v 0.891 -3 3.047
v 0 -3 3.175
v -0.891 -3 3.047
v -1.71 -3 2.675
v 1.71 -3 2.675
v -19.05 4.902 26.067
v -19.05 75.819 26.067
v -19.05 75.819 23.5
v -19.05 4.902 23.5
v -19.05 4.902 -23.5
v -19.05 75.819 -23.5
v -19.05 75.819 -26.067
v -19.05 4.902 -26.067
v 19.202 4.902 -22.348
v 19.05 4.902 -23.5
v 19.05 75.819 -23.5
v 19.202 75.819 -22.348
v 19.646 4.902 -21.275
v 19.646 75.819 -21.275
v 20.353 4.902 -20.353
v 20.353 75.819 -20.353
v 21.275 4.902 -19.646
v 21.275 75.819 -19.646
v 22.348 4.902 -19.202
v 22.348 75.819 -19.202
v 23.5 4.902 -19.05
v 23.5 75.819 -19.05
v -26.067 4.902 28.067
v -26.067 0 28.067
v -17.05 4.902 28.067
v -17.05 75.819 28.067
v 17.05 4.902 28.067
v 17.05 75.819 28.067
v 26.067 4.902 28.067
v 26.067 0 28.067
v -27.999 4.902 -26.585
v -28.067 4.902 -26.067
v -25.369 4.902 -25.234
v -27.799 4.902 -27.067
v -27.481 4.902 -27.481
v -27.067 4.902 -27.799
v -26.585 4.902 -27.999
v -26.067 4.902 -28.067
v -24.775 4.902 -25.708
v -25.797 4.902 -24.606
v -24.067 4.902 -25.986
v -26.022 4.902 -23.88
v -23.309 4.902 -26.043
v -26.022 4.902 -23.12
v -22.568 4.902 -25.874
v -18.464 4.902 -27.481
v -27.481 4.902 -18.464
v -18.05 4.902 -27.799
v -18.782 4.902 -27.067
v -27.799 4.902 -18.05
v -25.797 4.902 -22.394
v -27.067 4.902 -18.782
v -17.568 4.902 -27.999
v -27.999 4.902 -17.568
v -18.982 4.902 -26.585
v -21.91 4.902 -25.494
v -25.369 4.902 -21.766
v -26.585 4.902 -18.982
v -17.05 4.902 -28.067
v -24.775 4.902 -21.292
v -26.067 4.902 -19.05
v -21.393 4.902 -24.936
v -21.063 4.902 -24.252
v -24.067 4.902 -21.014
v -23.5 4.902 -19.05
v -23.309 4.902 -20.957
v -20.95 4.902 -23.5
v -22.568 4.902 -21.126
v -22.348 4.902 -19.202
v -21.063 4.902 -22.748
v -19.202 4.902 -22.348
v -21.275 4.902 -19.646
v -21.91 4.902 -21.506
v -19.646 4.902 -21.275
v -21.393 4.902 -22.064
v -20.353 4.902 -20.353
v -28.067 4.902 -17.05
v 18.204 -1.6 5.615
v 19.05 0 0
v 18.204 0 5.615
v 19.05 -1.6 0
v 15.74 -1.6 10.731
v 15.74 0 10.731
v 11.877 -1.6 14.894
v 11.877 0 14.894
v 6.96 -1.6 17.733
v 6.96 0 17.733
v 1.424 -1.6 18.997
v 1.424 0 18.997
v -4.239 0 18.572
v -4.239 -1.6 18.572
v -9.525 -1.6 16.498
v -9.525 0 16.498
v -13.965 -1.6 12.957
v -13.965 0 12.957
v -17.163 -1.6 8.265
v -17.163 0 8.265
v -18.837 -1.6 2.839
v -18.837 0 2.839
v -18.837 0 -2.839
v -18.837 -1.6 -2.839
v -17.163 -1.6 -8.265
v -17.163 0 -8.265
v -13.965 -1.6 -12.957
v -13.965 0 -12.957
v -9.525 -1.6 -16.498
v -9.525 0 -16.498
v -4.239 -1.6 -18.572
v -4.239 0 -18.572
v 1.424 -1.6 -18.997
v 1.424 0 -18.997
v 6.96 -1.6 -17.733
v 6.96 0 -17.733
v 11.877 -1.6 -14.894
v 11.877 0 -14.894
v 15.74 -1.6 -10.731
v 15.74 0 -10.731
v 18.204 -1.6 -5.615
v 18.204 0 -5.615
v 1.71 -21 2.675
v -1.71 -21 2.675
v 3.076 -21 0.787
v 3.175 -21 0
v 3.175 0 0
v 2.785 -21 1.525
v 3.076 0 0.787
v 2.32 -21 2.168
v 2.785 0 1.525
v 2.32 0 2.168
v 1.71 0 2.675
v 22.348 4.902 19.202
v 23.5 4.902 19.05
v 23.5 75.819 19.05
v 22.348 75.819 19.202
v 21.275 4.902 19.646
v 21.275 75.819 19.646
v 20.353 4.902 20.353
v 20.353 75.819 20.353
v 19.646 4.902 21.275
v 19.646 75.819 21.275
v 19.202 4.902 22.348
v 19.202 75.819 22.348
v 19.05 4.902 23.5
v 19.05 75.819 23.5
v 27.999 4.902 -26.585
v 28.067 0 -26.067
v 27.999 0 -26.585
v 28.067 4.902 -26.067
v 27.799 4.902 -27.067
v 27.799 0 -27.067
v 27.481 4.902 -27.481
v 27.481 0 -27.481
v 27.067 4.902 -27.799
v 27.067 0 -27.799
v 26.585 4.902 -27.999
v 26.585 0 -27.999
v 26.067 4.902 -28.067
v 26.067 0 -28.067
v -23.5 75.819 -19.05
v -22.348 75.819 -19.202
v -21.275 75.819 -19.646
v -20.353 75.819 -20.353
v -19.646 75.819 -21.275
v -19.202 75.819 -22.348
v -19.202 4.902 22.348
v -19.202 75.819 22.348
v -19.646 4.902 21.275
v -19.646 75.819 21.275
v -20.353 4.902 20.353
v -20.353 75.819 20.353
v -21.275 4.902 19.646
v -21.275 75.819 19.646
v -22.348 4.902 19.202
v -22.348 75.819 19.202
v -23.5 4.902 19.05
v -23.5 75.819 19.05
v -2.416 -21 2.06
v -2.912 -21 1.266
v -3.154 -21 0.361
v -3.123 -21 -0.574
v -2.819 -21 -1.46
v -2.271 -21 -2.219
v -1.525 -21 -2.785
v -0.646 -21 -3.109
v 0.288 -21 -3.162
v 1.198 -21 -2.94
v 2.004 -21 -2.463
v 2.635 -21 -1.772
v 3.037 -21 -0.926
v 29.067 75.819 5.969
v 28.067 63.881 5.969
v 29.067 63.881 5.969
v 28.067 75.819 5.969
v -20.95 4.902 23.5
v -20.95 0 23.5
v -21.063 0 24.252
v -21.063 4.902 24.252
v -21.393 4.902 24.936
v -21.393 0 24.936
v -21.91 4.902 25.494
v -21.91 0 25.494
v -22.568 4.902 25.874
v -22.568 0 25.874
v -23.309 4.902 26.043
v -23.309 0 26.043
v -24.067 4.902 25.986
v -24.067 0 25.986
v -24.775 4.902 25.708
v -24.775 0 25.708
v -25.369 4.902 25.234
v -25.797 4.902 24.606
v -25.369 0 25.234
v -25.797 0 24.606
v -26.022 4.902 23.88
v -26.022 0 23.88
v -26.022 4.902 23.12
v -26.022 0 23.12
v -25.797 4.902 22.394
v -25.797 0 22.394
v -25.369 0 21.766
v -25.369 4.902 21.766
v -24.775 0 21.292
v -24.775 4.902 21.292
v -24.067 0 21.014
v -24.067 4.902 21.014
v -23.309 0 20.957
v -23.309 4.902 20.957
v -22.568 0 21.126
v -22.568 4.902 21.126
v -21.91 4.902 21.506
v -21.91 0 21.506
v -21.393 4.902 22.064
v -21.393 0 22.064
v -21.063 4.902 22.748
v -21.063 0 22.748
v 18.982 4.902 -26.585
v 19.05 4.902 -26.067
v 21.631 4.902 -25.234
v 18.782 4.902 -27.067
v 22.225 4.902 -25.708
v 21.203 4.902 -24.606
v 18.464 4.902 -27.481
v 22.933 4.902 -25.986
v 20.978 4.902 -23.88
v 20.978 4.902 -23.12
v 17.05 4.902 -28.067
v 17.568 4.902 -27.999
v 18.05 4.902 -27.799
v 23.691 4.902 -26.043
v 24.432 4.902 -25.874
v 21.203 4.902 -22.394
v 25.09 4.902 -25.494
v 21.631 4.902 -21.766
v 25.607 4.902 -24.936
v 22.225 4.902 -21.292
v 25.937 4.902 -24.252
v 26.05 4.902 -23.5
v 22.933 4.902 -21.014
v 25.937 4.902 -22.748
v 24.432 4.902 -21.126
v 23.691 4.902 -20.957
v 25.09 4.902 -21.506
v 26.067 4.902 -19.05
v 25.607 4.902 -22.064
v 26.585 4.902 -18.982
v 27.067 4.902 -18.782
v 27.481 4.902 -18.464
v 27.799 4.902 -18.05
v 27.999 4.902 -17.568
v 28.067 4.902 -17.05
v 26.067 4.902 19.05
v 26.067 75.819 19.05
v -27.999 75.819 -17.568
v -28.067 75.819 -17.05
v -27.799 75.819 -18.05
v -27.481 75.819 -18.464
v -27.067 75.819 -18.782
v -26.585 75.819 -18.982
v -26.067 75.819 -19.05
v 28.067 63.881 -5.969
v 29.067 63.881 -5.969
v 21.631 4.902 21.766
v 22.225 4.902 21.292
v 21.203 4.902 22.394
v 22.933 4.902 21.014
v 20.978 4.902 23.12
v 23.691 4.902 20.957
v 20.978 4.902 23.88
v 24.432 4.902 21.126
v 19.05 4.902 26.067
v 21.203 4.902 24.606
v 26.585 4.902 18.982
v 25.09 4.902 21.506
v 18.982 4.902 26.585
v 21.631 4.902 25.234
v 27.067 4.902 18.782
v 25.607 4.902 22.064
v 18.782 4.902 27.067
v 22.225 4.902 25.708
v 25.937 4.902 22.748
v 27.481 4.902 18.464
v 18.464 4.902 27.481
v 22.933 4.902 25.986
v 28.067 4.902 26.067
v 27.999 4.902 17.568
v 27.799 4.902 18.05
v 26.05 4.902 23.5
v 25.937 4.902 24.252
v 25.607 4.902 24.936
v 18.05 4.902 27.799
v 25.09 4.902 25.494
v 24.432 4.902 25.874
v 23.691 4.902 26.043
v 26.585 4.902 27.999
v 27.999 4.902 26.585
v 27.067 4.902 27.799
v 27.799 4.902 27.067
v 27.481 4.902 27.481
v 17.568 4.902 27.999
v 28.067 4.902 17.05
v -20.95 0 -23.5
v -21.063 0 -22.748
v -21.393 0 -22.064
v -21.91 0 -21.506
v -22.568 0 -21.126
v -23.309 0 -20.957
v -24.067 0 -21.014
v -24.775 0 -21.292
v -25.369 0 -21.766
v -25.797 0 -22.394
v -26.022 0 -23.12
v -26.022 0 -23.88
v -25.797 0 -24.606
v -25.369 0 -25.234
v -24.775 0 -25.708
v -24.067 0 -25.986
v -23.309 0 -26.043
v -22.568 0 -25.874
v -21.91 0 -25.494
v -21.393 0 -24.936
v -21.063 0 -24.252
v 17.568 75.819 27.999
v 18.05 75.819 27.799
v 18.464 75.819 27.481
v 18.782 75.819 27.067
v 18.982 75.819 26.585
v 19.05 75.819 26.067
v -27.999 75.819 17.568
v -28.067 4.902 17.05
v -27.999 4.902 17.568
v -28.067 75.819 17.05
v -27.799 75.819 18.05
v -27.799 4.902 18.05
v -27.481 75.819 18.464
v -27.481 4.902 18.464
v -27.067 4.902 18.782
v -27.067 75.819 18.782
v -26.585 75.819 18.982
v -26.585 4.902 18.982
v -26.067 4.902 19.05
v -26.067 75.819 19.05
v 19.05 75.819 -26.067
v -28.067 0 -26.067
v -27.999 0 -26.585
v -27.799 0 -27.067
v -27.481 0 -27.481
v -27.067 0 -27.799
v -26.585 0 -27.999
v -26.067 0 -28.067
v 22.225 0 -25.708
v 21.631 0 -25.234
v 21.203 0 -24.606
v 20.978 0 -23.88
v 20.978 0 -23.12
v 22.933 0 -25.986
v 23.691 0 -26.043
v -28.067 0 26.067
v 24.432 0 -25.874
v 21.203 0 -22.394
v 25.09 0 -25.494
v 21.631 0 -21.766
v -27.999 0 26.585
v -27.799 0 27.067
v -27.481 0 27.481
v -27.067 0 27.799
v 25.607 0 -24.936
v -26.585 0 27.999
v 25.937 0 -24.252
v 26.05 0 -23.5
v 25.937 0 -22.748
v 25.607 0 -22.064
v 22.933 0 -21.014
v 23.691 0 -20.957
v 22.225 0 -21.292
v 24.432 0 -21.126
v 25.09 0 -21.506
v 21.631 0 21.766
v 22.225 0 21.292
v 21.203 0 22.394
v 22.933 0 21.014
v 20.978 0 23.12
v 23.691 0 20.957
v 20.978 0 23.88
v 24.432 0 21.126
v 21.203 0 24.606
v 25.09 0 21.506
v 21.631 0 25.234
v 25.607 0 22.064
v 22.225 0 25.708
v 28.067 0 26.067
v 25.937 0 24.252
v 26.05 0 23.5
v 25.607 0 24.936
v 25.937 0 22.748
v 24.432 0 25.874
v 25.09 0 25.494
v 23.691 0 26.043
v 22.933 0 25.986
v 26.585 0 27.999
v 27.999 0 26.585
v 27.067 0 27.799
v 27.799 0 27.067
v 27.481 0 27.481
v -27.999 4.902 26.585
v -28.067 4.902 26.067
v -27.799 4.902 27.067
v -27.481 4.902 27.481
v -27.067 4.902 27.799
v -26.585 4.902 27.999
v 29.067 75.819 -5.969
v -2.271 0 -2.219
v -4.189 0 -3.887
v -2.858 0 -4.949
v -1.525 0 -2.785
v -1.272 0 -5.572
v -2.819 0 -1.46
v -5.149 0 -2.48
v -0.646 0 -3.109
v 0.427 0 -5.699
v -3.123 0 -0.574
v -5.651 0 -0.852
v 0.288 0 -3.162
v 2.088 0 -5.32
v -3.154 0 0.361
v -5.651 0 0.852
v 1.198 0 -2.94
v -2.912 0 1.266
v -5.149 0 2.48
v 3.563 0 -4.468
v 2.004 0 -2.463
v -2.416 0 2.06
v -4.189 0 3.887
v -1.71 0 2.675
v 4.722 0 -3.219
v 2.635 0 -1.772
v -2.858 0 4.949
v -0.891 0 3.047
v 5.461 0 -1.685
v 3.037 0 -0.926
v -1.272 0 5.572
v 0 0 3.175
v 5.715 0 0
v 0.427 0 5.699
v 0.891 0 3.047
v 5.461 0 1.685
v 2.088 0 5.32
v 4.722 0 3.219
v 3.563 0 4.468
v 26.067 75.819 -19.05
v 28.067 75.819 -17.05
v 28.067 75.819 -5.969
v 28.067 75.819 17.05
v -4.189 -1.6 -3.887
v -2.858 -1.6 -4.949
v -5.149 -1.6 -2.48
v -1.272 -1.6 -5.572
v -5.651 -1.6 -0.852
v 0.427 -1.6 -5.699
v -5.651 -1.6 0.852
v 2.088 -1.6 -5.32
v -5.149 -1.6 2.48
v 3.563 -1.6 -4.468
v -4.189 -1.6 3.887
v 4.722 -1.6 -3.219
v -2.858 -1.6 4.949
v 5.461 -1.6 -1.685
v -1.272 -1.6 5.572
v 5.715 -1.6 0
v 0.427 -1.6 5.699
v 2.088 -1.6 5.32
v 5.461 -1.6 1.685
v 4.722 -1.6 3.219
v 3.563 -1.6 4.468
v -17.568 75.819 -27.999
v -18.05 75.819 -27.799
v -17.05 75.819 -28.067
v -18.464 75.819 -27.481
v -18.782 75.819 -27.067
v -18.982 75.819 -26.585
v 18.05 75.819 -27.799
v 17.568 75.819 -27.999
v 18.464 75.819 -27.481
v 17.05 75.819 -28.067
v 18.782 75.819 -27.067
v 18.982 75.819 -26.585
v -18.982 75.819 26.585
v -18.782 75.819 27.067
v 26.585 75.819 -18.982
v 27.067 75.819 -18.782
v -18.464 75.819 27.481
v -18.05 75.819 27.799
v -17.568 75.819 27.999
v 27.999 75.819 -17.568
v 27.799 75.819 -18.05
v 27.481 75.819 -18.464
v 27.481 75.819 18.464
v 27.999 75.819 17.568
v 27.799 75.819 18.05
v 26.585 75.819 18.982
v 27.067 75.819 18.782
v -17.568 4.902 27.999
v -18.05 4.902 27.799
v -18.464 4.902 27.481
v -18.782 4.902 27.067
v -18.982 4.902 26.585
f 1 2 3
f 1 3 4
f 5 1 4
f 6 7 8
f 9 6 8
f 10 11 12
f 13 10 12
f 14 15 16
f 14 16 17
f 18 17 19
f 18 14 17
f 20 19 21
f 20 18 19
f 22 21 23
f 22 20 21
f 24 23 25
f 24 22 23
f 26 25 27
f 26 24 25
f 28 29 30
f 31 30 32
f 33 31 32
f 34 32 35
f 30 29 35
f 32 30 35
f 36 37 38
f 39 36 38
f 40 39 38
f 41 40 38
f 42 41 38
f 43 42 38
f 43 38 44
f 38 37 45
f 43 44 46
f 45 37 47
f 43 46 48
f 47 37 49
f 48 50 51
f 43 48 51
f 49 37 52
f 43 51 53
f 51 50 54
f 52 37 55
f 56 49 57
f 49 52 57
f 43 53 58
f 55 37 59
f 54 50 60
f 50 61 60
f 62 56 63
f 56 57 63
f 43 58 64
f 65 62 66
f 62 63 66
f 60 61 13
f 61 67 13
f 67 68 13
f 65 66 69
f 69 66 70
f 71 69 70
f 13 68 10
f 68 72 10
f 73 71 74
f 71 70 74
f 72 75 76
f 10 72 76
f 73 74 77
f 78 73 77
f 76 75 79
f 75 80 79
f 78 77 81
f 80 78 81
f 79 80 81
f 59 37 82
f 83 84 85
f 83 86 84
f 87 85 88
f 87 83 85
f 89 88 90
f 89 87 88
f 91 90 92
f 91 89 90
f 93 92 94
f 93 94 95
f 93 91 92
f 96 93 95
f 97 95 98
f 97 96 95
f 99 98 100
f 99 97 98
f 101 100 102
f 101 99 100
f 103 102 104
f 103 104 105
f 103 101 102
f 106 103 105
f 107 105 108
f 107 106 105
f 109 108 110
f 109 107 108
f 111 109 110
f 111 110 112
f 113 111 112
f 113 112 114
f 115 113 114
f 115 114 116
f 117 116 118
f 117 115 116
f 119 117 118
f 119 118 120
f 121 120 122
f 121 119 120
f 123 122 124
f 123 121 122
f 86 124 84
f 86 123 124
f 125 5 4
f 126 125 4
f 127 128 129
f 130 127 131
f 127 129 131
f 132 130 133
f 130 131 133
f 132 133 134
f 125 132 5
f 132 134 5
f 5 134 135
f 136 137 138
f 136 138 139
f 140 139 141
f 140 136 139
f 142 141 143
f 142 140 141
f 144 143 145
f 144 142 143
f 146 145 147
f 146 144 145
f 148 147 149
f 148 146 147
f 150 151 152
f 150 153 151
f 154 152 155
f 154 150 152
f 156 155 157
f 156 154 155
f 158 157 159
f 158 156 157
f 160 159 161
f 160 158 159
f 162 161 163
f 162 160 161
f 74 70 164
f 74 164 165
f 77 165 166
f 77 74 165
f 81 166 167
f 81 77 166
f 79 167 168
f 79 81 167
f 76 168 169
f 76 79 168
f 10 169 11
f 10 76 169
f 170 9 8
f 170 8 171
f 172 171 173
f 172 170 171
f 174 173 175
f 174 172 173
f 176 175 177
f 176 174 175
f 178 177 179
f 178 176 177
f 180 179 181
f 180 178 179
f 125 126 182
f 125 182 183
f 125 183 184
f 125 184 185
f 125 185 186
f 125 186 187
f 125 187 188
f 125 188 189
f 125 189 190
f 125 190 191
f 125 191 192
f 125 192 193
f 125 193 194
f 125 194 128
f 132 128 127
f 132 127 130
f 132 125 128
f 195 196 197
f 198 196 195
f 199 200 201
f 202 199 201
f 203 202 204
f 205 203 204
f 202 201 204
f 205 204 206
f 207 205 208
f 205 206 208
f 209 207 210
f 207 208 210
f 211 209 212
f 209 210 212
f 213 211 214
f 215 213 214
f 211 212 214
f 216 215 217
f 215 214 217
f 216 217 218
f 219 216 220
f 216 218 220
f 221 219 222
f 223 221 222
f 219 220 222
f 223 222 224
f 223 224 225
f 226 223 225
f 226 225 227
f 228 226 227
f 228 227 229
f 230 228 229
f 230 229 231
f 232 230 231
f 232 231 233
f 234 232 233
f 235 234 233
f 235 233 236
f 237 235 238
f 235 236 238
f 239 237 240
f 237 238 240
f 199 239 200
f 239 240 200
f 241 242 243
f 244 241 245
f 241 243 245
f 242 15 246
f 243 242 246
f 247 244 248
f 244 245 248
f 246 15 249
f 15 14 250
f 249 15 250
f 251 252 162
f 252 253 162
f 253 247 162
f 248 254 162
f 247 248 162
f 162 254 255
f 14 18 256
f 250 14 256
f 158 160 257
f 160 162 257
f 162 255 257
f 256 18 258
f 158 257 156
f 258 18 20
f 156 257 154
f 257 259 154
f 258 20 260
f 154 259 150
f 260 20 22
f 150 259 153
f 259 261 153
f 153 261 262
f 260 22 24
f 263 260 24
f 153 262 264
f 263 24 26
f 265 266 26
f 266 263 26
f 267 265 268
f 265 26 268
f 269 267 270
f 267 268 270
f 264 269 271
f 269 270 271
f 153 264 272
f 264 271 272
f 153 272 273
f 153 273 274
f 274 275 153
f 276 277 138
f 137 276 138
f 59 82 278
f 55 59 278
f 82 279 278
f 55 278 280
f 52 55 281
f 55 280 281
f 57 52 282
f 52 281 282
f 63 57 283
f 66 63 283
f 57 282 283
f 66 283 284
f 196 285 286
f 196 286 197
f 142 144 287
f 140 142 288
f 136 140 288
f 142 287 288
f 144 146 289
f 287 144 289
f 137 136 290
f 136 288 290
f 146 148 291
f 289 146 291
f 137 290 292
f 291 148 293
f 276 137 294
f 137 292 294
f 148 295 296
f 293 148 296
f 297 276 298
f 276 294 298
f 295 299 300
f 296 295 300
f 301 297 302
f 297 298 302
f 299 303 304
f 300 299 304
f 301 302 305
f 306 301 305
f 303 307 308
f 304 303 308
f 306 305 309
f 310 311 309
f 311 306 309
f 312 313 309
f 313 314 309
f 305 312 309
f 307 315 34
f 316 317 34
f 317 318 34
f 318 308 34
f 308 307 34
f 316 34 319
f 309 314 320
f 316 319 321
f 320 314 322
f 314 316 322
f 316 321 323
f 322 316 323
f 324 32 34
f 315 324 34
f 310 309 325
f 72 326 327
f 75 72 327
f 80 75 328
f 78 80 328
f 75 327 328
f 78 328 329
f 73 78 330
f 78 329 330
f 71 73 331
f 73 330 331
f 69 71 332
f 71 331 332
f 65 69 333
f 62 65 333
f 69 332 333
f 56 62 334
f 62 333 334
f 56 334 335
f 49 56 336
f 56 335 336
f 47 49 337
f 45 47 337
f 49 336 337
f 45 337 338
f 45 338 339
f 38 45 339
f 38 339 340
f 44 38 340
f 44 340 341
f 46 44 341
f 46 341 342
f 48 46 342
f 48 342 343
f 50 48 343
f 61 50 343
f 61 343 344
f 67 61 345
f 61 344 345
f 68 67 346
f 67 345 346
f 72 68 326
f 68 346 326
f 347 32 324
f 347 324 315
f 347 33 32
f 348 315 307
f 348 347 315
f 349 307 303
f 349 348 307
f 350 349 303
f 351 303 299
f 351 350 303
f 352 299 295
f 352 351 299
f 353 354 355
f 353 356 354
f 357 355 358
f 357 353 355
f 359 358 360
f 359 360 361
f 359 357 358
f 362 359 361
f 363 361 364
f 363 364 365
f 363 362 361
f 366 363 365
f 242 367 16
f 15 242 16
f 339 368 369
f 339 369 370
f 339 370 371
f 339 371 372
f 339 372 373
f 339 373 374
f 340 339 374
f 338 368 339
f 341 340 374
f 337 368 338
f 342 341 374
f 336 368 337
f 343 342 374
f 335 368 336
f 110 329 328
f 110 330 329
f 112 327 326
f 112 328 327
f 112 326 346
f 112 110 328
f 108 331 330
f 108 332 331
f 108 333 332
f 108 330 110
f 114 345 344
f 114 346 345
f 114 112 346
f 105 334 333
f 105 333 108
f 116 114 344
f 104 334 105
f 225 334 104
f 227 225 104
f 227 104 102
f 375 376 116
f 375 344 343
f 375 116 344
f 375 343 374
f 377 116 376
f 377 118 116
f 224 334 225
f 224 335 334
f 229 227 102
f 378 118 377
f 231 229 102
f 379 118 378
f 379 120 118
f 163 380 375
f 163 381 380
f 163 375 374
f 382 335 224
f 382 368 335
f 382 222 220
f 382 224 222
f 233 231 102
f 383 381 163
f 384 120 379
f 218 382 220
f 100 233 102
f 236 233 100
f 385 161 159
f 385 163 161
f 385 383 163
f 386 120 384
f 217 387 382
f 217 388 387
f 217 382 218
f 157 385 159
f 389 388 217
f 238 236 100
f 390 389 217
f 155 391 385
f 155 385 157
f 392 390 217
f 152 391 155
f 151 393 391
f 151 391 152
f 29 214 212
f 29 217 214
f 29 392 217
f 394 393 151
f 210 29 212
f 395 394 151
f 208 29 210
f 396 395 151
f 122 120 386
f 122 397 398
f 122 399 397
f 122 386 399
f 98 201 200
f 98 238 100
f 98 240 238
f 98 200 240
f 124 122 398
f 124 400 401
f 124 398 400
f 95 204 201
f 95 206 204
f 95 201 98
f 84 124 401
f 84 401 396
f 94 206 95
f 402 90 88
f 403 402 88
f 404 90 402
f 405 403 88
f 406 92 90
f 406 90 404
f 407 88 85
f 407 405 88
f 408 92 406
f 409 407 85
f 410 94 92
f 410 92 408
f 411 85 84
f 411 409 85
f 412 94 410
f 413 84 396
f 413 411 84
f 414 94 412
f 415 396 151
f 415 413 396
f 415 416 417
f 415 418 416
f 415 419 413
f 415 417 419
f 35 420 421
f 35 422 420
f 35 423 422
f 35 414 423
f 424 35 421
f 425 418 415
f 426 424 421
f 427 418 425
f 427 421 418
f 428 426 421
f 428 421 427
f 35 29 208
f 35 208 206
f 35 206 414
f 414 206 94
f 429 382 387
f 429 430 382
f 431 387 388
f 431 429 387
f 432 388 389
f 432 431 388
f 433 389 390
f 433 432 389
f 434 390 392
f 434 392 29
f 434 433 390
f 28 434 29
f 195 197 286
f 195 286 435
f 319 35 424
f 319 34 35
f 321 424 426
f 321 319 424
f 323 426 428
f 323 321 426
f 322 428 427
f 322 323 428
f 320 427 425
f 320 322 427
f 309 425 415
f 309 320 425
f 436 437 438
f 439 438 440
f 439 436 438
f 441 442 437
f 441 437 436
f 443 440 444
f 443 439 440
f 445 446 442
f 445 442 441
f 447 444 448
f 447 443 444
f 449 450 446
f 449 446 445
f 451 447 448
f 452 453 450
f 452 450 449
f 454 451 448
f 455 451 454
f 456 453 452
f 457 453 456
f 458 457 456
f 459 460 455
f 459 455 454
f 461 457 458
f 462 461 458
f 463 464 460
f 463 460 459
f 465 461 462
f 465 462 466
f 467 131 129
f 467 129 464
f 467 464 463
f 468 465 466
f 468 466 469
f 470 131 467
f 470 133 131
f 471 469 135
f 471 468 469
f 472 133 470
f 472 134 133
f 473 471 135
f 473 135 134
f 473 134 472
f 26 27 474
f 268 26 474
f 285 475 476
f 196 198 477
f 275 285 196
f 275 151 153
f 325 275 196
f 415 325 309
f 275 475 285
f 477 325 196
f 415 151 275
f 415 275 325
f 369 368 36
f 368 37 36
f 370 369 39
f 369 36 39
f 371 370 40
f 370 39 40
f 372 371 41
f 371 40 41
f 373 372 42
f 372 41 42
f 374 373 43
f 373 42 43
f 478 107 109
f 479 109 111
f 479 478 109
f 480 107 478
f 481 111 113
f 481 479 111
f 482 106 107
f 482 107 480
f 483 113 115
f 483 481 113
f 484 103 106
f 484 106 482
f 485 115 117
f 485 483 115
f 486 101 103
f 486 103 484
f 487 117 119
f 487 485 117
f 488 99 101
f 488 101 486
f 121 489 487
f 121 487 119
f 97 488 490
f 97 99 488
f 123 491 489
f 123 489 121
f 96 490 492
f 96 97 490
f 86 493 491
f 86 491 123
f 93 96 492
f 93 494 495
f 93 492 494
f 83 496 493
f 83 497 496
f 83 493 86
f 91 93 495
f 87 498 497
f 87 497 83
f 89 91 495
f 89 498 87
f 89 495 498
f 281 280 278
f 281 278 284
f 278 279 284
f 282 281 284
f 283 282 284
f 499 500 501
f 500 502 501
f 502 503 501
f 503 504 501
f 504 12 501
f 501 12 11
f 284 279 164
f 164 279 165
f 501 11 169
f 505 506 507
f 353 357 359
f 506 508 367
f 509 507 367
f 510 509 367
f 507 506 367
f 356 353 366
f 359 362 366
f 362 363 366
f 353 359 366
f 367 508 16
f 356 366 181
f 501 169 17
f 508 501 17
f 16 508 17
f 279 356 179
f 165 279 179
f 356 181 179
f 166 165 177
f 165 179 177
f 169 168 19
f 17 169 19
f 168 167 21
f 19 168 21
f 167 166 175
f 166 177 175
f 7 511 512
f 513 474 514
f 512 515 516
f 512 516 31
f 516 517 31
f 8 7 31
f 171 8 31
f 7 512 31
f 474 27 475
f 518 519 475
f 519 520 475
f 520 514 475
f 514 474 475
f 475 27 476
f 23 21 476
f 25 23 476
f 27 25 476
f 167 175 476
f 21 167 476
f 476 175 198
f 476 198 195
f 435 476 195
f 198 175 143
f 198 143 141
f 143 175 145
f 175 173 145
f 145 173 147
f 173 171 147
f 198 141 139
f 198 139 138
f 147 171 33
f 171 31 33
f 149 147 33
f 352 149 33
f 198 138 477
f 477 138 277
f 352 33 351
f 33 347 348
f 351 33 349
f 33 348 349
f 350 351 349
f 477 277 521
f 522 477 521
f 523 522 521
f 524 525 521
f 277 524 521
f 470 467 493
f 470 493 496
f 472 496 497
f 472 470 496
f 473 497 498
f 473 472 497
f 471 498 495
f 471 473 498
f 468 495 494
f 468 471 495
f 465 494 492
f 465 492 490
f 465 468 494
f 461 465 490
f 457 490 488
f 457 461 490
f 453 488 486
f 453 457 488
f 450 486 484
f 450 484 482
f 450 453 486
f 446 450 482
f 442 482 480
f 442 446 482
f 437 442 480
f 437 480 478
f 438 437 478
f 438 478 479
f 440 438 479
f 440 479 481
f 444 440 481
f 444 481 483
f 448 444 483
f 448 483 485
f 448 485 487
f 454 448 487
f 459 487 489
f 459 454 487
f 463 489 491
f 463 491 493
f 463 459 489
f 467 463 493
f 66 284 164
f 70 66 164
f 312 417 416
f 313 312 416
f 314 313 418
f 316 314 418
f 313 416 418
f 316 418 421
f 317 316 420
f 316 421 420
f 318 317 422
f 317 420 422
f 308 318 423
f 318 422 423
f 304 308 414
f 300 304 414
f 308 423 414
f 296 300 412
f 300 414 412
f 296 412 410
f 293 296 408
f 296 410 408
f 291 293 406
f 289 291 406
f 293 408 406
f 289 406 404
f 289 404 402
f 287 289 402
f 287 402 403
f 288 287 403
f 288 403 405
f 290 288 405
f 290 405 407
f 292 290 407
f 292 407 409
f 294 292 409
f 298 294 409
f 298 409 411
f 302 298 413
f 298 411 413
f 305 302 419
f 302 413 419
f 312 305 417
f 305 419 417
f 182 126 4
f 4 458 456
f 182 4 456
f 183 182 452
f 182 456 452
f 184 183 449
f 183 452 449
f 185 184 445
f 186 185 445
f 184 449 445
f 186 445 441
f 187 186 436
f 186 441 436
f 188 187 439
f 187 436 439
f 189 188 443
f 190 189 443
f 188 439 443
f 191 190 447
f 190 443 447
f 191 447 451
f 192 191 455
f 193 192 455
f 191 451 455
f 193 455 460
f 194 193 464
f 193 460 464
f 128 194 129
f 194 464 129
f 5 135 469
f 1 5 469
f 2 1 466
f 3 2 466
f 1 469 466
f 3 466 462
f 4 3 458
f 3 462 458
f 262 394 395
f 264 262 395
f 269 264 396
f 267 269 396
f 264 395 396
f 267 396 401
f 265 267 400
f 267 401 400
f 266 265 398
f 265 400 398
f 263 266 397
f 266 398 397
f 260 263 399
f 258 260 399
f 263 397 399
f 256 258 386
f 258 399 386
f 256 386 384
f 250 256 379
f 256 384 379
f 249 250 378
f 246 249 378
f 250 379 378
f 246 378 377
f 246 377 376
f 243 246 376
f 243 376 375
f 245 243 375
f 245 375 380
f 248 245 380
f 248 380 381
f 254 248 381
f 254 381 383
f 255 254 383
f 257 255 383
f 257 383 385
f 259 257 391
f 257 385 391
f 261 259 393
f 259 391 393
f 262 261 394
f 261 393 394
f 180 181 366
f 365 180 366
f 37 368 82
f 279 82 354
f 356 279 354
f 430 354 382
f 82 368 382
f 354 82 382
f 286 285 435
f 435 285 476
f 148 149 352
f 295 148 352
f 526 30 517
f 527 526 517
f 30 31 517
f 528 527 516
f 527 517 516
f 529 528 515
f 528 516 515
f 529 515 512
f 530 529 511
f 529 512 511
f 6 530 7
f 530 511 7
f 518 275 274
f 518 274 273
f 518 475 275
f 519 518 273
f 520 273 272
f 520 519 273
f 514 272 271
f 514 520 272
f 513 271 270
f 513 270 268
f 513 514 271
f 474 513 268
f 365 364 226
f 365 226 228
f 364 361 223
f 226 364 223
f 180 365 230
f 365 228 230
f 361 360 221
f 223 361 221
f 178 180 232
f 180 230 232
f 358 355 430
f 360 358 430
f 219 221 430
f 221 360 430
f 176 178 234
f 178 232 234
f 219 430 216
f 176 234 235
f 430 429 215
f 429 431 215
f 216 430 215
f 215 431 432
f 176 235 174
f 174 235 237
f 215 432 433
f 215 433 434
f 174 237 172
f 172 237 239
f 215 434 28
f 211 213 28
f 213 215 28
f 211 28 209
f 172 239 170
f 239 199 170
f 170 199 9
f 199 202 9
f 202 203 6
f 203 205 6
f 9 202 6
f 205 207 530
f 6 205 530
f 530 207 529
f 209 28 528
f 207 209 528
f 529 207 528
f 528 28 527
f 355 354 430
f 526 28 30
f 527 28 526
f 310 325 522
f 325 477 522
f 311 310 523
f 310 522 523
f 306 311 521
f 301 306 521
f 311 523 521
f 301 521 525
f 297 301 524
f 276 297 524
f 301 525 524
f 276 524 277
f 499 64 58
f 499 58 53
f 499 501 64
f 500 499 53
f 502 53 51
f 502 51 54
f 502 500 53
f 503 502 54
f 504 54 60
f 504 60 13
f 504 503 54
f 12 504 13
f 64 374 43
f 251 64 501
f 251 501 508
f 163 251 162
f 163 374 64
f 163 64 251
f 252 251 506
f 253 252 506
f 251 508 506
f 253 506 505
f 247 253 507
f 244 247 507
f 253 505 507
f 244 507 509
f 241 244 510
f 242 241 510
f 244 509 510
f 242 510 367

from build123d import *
from build123d import SkipClean  # not in build123d's __all__

# Parameters (mm, degrees)
F1_DEPTH      = 21
F2_DEPTH      = 3
F0_R          = 19.05
F0_R_2        = 5.715
F3_DEPTH      = 1.6
F3_DEPTH_BACK = 10
F0_W          = 56.134
F0_H          = 56.134
F0_R_3        = 2.55
F4_DEPTH      = 4.9022
F6_DEPTH      = 75.819
F7_R          = 2
F8_W          = 11.938
F8_H          = 11.938
F9_DEPTH      = 1


with BuildPart() as f1:
    # F0 (on Front) → F1 (new body)
    with BuildSketch(Plane.XZ):
        with BuildLine():
            ThreePointArc((-1.7102631376, 2.675), (-1.5248835264, -2.7848438432), (3.175, 0))
            ThreePointArc((3.175, 0), (2.7848438432, 1.5248835264), (1.7102631376, 2.675))
            Line((1.7102631376, 2.675), (-1.7102631376, 2.675))
        make_face()
    extrude(amount=F1_DEPTH)

    # F0 (on Front) → F2 (join, symmetric)
    with BuildSketch(Plane.XZ):
        with BuildLine():
            Line((-1.7102631376, 2.675), (1.7102631376, 2.675))
            ThreePointArc((1.7102631376, 2.675), (0, 3.175), (-1.7102631376, 2.675))
        make_face()
        with BuildLine():
            ThreePointArc((-1.7102631376, 2.675), (-1.5248835264, -2.7848438432), (3.175, 0))
            ThreePointArc((3.175, 0), (2.7848438432, 1.5248835264), (1.7102631376, 2.675))
            Line((1.7102631376, 2.675), (-1.7102631376, 2.675))
        make_face()
    with SkipClean():  # cleaning this boolean's faces spoils the solid; the shape is the same uncleaned
        extrude(amount=F2_DEPTH, both=True)



with BuildPart() as f3:
    # F0 (on Front) → F3 (new body, two sides)
    with BuildSketch(Plane.XZ) as f3_sk:
        Circle(F0_R)
        Circle(F0_R_2, mode=Mode.SUBTRACT)
    extrude(amount=F3_DEPTH)
    extrude(f3_sk.sketch, amount=-F3_DEPTH_BACK)

    # F0 (on Front) → F4 (join)
    with BuildSketch(Plane.XZ):
        Rectangle(F0_W, F0_H)
        with Locations((-23.5, -23.5)):
            Circle(F0_R_3, mode=Mode.SUBTRACT)
        with Locations((23.5, -23.5)):
            Circle(F0_R_3, mode=Mode.SUBTRACT)
        with Locations((-23.5, 23.5)):
            Circle(F0_R_3, mode=Mode.SUBTRACT)
        Circle(F0_R, mode=Mode.SUBTRACT)
        with Locations((23.5, 23.5)):
            Circle(F0_R_3, mode=Mode.SUBTRACT)
    extrude(amount=-F4_DEPTH)


with BuildPart() as f1_1:
    add(f1.part, clean=False)

    with SkipClean():  # cleaning this boolean's faces spoils the solid; the shape is the same uncleaned
        add(f3.part)  # F6 merges F3
    # F5 (on Front) → F6 (join)
    with BuildSketch(Plane.XZ):
        with BuildLine():
            ThreePointArc((-19.05, 23.5), (-20.3533748237, 20.3533748237), (-23.5, 19.05))
            Line((-23.5, 19.05), (-28.067, 19.05))
            Line((-28.067, 19.05), (-28.067, -19.05))
            Line((-28.067, -19.05), (-23.5, -19.05))
            ThreePointArc((-23.5, -19.05), (-20.3533748237, -20.3533748237), (-19.05, -23.5))
            Line((-19.05, -23.5), (-19.05, -28.067))
            Line((-19.05, -28.067), (19.05, -28.067))
            Line((19.05, -28.067), (19.05, -23.5))
            ThreePointArc((19.05, -23.5), (20.3533748237, -20.3533748237), (23.5, -19.05))
            Line((23.5, -19.05), (28.067, -19.05))
            Line((28.067, -19.05), (28.067, 19.05))
            Line((28.067, 19.05), (23.5, 19.05))
            ThreePointArc((23.5, 19.05), (20.3533748237, 20.3533748237), (19.05, 23.5))
            Line((19.05, 23.5), (19.05, 28.067))
            Line((19.05, 28.067), (-19.05, 28.067))
            Line((-19.05, 28.067), (-19.05, 23.5))
        make_face()
    with SkipClean():  # cleaning this boolean's faces spoils the solid; the shape is the same uncleaned
        extrude(amount=-F6_DEPTH)

    # F7
    f7_edges = [f1_1.edges().sort_by_distance(p)[0] for p in [
        (19.05, 40.3606, 28.067),
        (28.067, 40.3606, 19.05),
        (28.067, 2.4511, 28.067),
        (28.067, 2.4511, -28.067),
        (28.067, 40.3606, -19.05),
        (19.05, 40.3606, -28.067),
        (-19.05, 40.3606, -28.067),
        (-28.067, 40.3606, -19.05),
        (-28.067, 2.4511, -28.067),
        (-28.067, 2.4511, 28.067),
        (-28.067, 40.3606, 19.05),
        (-19.05, 40.3606, 28.067),
    ]]
    fillet(f7_edges, radius=F7_R)

    # F8 (on face) → F9 (join)
    with BuildSketch(Plane.YZ.offset(28.067)):
        with Locations((69.85, 0)):
            Rectangle(F8_W, F8_H)
    extrude(amount=F9_DEPTH)


solid = f1_1.part
